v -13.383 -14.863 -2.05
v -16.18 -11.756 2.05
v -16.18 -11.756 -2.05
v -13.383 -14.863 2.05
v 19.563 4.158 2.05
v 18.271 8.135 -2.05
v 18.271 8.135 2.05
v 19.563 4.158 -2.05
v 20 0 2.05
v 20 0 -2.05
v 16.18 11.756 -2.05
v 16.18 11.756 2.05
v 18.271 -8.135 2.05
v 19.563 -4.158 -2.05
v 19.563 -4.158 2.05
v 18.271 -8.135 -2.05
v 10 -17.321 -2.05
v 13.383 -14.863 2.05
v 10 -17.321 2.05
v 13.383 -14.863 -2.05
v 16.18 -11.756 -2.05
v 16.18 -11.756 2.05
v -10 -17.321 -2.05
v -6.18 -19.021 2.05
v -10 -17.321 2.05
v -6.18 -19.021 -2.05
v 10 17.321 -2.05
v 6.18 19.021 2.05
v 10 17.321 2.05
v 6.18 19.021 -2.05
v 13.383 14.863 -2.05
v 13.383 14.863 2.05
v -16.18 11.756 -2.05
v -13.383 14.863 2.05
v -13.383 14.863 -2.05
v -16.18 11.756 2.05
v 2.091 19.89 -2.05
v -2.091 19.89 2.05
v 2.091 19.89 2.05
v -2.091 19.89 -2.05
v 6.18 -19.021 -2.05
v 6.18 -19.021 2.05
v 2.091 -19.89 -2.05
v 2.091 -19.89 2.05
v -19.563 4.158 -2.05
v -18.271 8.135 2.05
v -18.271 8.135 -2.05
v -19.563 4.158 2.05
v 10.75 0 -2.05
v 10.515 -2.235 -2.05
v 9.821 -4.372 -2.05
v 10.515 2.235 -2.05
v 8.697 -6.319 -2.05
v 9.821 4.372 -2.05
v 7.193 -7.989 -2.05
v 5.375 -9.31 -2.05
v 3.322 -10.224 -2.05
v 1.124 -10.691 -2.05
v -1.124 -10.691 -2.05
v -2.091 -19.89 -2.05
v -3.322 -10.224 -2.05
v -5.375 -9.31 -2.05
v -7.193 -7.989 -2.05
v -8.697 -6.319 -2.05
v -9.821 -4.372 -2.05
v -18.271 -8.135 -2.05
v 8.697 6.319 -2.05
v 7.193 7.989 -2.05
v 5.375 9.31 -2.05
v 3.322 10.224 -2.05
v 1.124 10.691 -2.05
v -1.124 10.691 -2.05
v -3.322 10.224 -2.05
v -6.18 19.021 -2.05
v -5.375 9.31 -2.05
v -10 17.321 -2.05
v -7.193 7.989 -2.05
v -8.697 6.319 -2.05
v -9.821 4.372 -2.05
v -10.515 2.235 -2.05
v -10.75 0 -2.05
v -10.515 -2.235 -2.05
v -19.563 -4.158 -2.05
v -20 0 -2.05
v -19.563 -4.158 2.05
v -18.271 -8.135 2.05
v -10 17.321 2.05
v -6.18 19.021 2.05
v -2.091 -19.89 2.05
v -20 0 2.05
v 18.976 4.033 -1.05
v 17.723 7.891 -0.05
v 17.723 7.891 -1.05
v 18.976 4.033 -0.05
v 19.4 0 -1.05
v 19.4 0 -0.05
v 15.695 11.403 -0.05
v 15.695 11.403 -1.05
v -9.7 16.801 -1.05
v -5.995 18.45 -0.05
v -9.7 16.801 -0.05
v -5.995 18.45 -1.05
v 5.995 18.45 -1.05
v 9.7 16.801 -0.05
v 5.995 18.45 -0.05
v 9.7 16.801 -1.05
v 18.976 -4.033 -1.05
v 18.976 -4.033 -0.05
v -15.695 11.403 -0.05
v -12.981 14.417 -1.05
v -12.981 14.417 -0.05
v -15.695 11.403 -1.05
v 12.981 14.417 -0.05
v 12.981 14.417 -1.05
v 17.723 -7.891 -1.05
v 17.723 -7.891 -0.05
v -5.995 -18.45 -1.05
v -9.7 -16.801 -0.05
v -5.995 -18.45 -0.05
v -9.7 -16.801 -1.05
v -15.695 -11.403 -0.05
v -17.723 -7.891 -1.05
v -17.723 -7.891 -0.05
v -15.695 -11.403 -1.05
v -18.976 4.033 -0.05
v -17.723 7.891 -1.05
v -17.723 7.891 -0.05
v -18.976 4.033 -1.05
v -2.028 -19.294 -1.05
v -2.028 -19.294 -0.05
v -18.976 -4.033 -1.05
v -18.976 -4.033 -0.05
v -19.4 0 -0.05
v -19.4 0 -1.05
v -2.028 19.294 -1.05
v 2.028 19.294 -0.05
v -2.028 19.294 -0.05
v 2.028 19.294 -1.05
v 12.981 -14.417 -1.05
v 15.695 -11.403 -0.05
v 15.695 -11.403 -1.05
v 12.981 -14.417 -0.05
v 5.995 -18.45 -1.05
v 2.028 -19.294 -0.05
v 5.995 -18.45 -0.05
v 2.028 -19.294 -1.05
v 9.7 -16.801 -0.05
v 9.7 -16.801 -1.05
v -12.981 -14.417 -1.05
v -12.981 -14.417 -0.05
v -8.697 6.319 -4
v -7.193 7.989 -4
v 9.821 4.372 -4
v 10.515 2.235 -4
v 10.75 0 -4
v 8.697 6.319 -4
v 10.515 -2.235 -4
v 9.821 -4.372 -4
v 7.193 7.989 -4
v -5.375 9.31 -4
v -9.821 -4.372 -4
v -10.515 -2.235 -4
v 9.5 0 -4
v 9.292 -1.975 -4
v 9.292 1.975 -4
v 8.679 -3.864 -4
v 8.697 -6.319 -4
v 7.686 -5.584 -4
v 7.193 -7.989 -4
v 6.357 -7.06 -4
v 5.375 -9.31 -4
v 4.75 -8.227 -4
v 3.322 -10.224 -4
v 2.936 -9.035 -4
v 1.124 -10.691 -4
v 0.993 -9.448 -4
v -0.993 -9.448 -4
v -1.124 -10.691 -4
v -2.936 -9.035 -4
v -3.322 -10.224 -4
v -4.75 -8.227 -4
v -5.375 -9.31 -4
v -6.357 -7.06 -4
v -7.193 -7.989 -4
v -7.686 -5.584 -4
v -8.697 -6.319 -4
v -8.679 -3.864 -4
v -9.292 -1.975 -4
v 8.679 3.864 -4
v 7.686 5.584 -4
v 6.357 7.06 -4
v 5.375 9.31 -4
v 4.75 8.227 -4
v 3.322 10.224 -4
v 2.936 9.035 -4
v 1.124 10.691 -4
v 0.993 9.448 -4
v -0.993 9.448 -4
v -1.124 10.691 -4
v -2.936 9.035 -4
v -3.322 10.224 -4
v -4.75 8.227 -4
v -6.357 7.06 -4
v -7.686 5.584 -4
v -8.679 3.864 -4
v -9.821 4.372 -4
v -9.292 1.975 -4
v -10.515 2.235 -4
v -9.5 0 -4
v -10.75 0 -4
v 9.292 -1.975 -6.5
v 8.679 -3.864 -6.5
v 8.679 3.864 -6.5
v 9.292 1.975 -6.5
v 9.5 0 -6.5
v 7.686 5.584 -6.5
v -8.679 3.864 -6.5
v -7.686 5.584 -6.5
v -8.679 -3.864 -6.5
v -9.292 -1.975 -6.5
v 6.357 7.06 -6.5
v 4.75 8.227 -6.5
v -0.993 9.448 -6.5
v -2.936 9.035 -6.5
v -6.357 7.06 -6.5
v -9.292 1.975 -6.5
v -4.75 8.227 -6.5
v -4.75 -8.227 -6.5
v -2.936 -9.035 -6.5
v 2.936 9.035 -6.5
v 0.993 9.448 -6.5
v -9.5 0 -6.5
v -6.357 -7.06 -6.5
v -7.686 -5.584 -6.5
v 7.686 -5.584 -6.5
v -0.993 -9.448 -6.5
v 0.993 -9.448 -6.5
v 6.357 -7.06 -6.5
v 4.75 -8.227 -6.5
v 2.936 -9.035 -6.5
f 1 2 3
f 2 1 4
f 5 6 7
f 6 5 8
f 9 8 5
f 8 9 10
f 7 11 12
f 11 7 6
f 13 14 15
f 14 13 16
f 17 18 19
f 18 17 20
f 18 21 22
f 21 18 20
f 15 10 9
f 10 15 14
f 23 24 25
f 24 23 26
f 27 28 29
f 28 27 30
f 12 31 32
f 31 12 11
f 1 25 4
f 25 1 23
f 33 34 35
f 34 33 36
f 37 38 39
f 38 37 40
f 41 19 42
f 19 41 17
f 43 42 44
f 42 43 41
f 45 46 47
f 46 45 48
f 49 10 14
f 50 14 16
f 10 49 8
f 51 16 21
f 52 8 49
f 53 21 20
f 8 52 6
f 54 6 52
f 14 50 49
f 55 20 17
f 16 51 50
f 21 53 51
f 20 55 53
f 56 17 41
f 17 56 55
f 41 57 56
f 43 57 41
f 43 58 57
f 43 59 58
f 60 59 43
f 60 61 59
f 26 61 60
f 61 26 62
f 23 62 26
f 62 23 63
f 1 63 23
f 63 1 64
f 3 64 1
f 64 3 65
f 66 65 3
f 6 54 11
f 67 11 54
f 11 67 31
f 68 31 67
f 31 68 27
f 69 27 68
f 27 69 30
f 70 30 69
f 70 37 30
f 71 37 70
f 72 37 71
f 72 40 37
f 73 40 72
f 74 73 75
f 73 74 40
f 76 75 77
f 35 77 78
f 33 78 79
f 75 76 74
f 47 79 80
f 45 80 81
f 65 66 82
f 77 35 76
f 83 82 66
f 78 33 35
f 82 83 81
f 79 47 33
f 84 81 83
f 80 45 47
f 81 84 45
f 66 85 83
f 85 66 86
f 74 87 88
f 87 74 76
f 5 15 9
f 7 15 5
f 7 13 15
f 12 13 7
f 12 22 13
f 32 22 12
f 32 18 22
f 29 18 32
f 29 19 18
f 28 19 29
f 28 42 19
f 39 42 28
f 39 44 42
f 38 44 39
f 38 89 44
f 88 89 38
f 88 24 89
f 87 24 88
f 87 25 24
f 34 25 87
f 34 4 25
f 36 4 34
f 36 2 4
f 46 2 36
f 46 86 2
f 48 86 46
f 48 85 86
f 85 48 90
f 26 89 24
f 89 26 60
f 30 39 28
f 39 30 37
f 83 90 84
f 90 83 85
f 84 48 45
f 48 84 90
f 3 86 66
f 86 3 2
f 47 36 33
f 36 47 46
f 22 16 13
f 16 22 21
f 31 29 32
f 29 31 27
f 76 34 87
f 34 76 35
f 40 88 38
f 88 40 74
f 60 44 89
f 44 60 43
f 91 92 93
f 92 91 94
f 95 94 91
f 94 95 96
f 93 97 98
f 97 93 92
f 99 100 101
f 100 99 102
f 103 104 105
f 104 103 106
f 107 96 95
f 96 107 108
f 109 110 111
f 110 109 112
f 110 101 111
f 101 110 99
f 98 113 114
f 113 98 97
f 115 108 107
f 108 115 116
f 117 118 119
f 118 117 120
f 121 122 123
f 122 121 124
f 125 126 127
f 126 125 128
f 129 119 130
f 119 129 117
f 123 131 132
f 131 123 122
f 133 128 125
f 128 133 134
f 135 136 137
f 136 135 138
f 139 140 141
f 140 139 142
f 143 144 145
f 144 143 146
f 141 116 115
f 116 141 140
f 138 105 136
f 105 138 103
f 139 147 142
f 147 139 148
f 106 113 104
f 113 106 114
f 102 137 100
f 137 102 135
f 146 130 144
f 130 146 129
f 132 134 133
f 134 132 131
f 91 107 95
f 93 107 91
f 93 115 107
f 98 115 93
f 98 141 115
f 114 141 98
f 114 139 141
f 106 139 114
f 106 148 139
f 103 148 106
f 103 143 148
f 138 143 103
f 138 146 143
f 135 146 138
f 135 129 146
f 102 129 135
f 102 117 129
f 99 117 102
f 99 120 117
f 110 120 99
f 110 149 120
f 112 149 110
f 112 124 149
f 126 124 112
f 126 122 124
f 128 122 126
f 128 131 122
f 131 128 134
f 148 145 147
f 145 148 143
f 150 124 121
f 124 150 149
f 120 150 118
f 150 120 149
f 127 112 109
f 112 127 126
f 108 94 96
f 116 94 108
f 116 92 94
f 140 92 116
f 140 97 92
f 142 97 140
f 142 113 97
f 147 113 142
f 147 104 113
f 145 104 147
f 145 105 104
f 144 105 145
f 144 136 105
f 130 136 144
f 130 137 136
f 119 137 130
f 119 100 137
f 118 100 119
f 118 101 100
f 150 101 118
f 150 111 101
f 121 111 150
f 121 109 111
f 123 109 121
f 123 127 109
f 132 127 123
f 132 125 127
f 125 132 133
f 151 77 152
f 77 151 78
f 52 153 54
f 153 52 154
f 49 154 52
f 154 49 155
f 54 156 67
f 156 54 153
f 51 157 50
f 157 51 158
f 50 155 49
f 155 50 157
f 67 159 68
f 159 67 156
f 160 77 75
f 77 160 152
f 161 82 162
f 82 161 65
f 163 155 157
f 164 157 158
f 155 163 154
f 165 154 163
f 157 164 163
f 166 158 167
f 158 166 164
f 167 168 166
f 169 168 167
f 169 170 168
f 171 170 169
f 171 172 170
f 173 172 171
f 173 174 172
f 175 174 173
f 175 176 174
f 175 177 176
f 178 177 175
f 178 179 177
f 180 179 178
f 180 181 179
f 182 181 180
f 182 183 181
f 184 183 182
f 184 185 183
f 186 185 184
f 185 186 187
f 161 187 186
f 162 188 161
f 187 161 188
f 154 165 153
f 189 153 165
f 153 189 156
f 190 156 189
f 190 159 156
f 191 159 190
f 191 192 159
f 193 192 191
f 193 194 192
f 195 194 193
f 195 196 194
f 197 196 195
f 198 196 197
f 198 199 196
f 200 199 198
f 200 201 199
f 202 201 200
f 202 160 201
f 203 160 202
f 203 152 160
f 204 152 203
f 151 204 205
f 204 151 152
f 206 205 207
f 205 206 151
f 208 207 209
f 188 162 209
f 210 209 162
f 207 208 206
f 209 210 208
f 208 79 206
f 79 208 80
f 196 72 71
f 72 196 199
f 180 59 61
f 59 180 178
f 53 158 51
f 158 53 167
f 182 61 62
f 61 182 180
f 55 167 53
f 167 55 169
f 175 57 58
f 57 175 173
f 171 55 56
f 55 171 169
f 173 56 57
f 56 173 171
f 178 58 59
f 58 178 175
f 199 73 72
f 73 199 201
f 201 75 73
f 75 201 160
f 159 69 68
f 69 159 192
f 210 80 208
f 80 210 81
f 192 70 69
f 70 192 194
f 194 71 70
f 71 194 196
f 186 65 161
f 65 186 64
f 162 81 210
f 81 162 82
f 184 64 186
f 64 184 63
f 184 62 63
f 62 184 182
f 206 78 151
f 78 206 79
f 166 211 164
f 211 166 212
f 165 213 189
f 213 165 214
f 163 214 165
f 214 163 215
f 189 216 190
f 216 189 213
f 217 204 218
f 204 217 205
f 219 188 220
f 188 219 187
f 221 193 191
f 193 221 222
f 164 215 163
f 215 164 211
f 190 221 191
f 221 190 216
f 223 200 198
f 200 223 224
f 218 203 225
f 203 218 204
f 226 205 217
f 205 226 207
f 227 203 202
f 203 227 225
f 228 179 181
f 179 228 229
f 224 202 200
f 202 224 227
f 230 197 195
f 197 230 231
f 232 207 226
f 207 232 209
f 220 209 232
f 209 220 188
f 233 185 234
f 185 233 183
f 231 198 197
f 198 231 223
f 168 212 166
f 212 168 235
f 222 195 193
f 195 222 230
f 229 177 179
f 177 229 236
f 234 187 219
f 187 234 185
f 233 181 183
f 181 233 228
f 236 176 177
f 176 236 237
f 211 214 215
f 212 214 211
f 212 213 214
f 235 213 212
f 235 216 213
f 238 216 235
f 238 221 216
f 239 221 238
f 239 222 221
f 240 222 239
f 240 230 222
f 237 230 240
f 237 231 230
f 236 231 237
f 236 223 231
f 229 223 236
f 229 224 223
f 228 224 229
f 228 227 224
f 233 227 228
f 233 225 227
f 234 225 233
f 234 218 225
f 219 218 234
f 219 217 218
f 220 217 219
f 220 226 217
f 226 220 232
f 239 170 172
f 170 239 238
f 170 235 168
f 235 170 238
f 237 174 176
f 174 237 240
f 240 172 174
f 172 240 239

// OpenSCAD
//$fa=0.01;
//$fs=0.5;

module athes7Element() {
	union() {
		difference() {
			color("dimgray")
			cylinder(r=20,h=4.1,center=true);
			translate([0,0,1])
				cylinder(r=19.4,h=4.1,center=true);
		}
		color("silver")
		translate([0,0,1])
		cylinder(r=19.4,h=2.1,center=true);
			
		color("dimgray")
		translate([0,0,-3])
		cylinder(r=21.5/2,h=2,center=true);

		translate([0,0,-5])
		cylinder(r=19/2,h=3,center=true);		
	}
}

athes7Element();
